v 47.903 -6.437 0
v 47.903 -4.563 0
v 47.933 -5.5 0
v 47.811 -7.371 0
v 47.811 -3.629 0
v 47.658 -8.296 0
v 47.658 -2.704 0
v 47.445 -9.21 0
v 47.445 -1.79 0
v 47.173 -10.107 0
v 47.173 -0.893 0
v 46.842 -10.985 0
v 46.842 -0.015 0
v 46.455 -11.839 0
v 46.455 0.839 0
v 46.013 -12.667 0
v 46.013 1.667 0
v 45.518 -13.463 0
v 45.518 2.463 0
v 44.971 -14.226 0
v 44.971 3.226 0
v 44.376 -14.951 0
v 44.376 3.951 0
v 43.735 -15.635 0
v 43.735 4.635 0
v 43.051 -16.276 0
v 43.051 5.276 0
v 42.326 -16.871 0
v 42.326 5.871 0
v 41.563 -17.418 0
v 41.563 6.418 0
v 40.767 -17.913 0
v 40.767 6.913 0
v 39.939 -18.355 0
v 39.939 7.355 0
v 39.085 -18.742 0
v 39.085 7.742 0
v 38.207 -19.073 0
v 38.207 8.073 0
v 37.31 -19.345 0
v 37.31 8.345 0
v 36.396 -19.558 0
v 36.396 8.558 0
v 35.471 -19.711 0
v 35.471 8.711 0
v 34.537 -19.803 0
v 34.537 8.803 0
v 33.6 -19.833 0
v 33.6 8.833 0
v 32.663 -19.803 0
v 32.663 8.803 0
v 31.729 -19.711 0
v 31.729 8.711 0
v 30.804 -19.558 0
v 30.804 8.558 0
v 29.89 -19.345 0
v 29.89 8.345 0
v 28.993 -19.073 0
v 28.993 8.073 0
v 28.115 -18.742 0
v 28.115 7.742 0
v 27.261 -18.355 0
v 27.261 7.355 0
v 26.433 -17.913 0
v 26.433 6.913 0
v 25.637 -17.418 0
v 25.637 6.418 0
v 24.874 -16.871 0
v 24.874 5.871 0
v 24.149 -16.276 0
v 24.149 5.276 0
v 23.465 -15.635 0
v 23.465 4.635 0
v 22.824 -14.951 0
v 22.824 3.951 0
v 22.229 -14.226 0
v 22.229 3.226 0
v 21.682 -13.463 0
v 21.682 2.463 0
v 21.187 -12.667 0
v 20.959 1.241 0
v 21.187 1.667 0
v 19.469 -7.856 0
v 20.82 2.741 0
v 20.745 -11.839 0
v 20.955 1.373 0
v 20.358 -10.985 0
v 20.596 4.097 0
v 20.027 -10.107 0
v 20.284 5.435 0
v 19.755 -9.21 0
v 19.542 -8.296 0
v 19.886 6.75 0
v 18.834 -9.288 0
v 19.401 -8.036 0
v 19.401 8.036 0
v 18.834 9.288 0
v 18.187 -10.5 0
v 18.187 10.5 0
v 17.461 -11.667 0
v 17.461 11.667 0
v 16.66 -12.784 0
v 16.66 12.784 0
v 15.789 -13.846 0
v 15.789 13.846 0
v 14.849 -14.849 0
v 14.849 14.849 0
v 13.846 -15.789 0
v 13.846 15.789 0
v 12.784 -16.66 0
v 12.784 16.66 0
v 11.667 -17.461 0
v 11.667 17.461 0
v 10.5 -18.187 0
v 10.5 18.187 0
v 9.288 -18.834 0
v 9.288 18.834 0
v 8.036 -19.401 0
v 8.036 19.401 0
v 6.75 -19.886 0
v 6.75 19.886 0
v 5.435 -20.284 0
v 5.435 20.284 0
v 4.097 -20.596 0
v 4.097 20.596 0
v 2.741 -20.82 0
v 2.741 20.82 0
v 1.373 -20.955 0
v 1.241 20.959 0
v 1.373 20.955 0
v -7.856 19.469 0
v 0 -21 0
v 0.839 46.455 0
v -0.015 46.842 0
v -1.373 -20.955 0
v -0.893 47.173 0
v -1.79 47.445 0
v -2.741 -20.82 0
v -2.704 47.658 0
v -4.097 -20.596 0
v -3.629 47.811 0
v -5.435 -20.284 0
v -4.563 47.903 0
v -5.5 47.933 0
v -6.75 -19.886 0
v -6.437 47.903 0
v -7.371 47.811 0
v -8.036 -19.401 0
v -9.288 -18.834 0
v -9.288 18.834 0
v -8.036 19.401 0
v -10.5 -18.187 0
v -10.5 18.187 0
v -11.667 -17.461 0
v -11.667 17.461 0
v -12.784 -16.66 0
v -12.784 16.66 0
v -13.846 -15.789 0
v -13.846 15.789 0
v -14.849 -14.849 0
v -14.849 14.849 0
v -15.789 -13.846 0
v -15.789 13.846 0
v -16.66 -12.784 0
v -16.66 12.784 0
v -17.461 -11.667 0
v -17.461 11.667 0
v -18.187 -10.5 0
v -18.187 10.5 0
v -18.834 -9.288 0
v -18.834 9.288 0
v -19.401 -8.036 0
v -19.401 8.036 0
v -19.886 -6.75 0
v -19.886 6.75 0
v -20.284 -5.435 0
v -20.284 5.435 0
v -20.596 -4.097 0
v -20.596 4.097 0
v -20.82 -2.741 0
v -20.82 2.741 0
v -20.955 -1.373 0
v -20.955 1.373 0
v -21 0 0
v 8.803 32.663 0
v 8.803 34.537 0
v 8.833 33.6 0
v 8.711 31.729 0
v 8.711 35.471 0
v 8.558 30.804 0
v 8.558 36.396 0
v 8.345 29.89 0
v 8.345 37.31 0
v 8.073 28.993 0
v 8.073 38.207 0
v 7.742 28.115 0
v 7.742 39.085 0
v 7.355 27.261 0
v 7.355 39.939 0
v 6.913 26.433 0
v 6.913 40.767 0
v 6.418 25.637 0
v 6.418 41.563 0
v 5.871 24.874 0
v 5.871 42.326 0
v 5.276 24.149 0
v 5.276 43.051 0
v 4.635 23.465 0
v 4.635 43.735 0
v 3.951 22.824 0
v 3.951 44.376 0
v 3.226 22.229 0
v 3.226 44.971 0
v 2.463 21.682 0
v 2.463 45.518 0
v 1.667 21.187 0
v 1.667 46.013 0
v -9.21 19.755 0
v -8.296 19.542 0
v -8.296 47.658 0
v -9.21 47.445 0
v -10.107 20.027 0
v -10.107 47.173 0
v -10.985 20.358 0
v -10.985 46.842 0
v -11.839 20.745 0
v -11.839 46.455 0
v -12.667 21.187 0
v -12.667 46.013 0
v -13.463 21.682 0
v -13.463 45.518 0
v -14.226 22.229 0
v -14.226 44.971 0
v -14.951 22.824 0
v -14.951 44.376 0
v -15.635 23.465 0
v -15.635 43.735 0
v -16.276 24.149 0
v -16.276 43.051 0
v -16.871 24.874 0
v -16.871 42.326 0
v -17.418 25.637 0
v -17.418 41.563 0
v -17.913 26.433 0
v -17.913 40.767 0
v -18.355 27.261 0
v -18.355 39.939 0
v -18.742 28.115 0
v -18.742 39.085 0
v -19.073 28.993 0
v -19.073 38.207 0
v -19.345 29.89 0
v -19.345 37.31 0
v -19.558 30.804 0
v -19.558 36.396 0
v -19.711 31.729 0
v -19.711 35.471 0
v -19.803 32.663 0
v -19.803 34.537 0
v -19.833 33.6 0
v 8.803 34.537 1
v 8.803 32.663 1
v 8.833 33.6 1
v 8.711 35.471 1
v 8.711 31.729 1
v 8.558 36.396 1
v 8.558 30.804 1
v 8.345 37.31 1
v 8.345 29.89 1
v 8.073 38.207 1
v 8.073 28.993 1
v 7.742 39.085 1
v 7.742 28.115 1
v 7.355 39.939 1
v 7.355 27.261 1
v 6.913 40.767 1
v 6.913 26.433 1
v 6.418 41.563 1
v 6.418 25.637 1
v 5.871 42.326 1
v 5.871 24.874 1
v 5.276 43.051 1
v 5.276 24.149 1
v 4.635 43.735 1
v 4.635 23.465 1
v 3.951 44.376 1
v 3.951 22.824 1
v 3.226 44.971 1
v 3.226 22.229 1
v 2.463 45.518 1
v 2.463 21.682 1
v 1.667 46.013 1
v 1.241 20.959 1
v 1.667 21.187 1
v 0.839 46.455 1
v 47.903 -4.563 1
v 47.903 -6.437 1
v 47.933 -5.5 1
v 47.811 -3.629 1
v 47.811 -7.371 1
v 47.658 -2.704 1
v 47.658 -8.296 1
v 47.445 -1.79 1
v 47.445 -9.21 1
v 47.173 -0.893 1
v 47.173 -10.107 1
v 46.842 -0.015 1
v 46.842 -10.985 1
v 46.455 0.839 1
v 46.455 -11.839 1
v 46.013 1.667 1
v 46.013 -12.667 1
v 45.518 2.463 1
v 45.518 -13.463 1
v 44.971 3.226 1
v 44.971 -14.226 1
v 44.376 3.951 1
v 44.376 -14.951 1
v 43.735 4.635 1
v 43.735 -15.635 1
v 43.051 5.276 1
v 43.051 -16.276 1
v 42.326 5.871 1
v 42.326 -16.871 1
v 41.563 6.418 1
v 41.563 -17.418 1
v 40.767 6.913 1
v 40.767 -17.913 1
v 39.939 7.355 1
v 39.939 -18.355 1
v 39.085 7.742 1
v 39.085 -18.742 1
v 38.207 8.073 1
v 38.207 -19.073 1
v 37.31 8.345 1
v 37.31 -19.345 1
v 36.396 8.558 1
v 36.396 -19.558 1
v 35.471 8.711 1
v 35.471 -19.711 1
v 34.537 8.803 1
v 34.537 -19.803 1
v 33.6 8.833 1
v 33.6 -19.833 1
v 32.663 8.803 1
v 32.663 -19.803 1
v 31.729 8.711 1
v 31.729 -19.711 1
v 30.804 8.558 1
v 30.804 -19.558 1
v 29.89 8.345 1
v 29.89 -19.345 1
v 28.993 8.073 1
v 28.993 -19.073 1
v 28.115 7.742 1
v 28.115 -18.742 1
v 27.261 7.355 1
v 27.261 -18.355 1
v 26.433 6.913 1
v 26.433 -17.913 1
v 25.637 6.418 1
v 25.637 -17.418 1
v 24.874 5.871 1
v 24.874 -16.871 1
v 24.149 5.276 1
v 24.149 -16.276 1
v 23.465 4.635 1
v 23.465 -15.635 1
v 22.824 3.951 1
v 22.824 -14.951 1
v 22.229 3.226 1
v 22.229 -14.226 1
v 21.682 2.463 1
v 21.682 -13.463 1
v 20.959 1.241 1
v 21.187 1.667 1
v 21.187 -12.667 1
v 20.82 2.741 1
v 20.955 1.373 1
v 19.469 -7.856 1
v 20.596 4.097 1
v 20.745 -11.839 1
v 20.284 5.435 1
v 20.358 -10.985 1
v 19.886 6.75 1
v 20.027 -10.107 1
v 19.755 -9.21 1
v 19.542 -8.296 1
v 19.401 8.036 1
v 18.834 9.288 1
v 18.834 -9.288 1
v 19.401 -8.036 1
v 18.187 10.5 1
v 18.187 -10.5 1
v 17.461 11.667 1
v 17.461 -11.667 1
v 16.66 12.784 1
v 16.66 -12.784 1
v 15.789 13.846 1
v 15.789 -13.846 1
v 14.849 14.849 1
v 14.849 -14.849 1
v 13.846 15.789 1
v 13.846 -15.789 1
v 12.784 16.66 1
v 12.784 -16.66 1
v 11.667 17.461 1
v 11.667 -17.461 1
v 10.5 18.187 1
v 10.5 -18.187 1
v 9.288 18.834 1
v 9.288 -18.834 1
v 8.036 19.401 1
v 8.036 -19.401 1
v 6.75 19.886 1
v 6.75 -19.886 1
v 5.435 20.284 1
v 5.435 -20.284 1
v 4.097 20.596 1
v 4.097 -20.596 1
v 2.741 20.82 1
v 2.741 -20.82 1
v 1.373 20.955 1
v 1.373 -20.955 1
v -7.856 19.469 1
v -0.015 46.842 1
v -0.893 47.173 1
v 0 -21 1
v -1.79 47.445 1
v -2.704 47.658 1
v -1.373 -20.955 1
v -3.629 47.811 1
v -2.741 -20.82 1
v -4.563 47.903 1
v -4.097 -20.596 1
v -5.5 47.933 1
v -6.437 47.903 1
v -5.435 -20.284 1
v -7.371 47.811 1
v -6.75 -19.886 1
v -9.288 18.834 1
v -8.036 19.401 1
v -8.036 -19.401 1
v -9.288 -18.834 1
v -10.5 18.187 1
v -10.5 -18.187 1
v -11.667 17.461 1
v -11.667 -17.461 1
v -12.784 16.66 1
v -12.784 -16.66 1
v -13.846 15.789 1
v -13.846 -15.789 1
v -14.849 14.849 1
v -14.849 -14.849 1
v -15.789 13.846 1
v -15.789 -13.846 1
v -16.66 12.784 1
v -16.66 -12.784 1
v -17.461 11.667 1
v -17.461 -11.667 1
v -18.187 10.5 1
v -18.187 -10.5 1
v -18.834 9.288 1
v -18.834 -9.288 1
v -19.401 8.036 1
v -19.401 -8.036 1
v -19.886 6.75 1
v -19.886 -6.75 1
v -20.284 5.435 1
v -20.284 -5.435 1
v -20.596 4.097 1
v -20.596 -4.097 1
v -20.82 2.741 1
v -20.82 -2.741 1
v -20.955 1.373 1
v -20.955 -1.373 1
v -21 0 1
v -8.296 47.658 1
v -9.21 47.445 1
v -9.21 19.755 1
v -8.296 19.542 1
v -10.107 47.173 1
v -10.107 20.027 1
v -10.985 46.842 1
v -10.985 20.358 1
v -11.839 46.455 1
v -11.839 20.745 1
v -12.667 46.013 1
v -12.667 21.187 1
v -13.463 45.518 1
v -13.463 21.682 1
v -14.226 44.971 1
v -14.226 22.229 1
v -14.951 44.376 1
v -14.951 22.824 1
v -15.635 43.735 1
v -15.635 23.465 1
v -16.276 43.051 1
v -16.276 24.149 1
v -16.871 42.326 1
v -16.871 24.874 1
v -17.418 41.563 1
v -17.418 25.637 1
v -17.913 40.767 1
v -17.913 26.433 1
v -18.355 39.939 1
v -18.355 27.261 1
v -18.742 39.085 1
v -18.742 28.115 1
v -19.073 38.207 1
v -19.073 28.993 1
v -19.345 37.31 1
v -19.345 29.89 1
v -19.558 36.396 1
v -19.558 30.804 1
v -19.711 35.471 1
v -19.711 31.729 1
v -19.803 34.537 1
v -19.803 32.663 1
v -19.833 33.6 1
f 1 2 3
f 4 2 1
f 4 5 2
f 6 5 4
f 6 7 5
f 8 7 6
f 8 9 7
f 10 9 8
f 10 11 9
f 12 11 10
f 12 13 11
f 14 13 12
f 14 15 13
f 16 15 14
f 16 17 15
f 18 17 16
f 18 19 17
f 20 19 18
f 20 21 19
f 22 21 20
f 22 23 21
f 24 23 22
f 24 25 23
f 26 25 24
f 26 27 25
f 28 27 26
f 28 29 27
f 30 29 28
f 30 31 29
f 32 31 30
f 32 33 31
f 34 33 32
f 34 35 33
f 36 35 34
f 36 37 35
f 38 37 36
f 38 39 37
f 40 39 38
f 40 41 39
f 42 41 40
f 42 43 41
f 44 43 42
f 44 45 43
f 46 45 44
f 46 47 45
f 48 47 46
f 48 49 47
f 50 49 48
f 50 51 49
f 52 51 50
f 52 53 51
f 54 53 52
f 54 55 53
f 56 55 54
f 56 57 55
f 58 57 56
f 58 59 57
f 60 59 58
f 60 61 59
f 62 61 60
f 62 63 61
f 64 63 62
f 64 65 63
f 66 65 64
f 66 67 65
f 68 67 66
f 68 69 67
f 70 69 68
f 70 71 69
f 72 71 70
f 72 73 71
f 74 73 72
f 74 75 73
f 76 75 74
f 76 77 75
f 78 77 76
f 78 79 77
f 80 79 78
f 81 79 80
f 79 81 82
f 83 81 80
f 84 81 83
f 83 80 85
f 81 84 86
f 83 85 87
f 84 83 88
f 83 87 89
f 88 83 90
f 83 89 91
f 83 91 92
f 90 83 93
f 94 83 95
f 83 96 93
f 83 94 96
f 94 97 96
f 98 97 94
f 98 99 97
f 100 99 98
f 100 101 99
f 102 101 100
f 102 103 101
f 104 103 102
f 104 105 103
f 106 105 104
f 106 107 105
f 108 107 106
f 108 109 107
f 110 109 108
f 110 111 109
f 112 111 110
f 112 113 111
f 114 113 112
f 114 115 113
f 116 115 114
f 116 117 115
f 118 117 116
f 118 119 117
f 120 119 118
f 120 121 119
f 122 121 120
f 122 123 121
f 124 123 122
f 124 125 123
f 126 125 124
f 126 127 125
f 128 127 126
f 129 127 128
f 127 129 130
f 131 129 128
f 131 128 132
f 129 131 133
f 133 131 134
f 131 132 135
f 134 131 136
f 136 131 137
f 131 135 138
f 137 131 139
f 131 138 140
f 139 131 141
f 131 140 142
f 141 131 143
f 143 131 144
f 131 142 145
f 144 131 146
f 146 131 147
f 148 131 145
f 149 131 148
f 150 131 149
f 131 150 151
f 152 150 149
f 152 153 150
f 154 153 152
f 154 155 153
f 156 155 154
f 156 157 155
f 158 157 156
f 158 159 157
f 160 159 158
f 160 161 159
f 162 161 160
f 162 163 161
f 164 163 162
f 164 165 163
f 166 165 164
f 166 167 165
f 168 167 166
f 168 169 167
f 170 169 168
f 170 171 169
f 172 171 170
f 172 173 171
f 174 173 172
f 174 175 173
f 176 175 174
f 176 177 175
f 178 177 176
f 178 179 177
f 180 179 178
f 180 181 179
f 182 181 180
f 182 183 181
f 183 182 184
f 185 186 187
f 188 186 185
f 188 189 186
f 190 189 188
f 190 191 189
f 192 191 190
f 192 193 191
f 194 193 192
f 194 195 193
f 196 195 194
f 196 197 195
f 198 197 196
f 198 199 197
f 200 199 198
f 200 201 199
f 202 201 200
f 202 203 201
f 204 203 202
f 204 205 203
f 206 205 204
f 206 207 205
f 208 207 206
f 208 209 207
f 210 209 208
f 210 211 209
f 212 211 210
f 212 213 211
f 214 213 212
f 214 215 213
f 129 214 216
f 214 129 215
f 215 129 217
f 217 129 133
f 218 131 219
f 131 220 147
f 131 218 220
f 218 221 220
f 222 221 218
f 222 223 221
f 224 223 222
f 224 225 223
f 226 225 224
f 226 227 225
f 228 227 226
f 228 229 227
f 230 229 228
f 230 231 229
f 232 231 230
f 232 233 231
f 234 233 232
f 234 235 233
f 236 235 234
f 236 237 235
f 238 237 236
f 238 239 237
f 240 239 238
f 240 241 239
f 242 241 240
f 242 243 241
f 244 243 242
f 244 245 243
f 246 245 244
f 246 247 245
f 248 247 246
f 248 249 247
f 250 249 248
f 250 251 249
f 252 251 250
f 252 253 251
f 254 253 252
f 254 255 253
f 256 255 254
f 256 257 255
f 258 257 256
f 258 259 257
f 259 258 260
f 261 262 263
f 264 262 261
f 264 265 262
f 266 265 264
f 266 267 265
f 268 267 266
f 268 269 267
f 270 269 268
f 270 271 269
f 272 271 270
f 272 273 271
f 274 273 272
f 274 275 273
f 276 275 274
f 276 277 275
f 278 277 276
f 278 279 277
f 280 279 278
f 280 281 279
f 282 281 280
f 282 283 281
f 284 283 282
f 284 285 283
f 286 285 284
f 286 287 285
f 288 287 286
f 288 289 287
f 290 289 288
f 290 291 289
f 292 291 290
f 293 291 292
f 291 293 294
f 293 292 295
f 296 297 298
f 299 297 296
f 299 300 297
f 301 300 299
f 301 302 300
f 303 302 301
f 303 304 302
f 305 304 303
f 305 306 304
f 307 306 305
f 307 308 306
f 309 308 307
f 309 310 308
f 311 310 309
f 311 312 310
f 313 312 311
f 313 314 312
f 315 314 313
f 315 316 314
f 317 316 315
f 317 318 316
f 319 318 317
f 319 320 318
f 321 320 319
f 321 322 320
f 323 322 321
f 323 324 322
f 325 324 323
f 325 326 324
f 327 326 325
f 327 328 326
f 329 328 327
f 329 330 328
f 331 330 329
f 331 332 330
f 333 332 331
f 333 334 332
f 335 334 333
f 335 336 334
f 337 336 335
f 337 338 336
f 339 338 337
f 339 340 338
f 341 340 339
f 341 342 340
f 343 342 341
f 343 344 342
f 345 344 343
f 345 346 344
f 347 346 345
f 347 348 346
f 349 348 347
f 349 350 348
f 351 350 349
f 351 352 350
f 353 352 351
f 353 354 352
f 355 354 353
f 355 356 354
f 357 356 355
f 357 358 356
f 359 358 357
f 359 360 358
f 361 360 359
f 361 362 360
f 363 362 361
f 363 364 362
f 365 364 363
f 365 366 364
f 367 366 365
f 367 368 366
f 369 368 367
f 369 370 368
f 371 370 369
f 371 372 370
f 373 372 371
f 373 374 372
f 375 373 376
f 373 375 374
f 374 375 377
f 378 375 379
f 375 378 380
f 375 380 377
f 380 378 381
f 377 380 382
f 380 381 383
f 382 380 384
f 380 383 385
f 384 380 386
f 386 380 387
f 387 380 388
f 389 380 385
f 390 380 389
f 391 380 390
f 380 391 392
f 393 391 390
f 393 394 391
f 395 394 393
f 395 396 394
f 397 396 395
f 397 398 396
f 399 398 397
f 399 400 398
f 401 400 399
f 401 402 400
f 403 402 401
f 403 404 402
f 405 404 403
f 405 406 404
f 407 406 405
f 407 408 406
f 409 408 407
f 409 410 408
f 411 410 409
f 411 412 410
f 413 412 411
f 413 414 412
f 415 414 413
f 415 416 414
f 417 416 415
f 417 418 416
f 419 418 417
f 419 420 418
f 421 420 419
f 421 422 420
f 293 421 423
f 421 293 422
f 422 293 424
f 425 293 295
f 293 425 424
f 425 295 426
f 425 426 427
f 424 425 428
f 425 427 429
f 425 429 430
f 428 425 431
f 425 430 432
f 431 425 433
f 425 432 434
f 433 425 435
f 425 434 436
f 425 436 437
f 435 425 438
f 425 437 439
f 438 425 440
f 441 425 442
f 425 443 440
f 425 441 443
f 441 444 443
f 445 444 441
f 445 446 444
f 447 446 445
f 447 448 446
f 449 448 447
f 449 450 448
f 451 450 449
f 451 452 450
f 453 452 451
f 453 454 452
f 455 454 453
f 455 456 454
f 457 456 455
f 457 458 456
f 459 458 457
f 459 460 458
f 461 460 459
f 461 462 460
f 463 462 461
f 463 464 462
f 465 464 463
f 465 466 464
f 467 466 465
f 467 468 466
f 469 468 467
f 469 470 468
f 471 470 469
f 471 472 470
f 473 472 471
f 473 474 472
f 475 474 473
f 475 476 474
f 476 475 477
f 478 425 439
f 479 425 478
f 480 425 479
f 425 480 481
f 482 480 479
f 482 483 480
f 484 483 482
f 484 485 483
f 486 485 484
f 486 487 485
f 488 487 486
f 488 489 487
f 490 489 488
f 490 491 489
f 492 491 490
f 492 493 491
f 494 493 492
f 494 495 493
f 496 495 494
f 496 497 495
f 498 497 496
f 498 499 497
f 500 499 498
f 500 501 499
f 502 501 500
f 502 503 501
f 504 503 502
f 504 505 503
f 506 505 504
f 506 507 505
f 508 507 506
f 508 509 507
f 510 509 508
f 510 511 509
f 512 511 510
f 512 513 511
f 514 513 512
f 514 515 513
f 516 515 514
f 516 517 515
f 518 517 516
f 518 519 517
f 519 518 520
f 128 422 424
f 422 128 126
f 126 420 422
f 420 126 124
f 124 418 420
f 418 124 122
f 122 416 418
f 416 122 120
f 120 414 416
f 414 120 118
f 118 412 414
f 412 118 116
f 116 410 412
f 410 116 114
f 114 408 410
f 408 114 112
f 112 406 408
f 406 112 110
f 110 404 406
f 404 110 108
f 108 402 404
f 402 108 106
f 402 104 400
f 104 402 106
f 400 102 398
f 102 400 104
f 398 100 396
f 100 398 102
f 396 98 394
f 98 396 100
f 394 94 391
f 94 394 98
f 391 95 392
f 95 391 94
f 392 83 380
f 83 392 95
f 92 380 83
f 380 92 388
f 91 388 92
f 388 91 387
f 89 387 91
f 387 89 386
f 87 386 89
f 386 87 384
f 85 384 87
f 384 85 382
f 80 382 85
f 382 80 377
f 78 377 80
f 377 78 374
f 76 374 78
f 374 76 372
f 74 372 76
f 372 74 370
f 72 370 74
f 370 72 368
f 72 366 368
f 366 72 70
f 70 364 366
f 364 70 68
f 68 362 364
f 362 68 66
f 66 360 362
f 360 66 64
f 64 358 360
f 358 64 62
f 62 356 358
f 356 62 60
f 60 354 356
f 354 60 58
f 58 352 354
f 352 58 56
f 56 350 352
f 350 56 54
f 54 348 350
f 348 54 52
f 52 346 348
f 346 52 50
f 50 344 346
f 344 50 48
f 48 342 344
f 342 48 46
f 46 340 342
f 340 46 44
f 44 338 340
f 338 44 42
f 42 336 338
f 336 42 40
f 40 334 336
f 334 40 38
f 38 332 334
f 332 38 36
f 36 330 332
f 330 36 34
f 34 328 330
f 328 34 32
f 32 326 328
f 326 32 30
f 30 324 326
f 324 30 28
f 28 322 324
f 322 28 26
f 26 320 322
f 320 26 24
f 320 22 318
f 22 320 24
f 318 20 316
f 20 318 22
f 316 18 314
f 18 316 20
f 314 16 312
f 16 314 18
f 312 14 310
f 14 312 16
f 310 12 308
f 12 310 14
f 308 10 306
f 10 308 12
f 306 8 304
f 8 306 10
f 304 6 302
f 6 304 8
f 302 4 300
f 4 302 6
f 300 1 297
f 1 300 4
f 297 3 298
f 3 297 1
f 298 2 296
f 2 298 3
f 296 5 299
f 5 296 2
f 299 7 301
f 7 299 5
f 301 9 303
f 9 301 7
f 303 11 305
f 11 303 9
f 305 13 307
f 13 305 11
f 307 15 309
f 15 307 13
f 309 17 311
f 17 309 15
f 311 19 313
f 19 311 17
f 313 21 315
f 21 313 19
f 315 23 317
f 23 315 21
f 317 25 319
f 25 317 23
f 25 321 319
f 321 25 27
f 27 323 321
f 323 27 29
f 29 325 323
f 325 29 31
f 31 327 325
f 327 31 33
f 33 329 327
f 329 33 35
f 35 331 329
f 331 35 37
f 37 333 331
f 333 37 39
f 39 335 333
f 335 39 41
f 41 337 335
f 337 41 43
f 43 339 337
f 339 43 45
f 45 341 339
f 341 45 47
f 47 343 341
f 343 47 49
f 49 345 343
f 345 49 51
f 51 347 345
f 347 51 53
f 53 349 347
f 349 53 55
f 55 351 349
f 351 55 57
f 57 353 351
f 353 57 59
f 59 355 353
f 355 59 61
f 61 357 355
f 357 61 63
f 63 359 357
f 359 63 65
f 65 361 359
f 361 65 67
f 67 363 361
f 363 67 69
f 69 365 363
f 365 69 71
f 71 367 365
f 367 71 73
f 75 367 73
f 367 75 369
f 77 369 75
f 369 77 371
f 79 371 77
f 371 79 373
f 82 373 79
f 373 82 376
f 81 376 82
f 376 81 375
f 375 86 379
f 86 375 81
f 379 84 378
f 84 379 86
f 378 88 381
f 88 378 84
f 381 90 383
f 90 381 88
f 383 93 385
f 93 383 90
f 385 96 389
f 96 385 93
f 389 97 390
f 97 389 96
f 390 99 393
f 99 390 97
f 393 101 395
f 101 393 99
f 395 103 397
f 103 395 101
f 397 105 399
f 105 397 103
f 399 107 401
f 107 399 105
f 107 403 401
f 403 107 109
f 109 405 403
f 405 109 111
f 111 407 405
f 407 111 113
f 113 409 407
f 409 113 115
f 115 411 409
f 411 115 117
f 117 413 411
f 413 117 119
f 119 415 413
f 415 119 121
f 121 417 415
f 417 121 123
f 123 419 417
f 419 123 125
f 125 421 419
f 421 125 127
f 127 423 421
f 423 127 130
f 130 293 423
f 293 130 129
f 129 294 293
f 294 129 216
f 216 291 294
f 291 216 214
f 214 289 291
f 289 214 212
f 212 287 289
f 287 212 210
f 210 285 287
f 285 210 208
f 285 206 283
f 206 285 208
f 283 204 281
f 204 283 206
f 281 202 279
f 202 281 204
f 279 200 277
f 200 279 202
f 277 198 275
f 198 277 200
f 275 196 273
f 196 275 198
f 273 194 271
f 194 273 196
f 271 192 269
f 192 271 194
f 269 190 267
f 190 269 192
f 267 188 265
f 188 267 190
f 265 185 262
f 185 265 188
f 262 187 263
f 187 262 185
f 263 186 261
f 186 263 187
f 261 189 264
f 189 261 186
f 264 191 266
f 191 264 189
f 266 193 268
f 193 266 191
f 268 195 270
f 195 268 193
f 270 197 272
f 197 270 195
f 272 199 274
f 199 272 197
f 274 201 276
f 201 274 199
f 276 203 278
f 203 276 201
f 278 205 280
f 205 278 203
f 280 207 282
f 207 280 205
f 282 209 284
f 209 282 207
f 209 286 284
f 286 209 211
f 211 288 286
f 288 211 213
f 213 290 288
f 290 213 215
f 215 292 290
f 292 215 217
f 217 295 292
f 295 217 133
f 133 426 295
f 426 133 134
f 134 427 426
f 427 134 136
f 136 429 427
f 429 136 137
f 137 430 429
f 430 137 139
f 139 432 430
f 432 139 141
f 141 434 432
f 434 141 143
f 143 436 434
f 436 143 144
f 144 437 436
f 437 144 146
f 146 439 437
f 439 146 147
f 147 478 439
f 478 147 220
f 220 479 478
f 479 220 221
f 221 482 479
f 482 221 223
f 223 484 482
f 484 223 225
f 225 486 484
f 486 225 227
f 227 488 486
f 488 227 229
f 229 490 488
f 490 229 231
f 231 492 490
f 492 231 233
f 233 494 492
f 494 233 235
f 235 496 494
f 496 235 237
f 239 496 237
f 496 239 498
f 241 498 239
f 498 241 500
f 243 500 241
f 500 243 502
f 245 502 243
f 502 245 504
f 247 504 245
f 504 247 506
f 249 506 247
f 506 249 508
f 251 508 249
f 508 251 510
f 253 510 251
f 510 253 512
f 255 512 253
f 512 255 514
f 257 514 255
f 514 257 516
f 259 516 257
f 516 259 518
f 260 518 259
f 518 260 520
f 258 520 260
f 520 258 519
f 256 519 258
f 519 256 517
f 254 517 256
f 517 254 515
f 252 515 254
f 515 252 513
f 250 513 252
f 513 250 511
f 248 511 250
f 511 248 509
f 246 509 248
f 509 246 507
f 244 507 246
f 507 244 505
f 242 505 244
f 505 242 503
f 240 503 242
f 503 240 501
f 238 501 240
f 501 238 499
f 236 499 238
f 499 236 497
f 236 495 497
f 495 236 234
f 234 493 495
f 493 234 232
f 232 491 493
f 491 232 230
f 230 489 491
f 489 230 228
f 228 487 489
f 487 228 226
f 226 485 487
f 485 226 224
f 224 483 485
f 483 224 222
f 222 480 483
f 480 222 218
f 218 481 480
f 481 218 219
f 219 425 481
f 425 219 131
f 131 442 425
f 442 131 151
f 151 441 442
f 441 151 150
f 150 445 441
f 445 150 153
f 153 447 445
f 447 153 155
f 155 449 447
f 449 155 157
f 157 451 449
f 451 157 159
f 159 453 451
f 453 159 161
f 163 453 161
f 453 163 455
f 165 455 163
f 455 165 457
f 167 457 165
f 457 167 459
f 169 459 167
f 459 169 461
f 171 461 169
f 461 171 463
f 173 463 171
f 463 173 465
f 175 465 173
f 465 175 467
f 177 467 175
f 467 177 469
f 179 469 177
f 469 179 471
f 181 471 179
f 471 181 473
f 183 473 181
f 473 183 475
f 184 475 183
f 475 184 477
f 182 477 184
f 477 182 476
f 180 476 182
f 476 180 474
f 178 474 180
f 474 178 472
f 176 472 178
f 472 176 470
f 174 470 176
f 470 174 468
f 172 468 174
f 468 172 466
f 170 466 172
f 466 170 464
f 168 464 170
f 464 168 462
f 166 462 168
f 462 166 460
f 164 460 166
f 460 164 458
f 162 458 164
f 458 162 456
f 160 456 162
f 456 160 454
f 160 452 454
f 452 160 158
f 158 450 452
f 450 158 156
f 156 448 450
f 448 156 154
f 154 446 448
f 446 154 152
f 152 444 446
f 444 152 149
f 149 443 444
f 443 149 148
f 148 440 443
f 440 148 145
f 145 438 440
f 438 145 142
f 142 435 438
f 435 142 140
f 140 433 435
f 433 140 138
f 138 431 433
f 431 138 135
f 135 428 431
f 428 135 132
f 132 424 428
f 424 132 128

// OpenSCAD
// file: random_maze_circle_generator.scad
use <2d.scad>;
use <random_maze_generator.scad>;

radius = 40; 

wall_height = 2;
wall_thickness = 2; 

cblocks = 25; 
rblocks = 5;

bottom = "YES";

module circle_maze(radius, cblocks, rblocks, thickness = 1) {
    full_circle_angle = 360;
    arc_angle = full_circle_angle / cblocks;
	length_rblock = radius / (rblocks + 2);
	
	maze = go_maze(1, 1, cblocks, rblocks, replace([rblocks, cblocks, 0, UP_RIGHT_WALL()], [rblocks, cblocks, 0, UP_WALL()], init_maze(cblocks, rblocks)));
	
	// inner circle
	rotate([0, 0, 180]) 
	    arc(length_rblock, [0, full_circle_angle - arc_angle], thickness);		
		
	rotate([0, 0, 315]) 	
	    x_line([length_rblock + thickness / 2, 0], length_rblock, thickness); 
		
	rotate([0, 0, arc_angle]) 
	    arc(length_rblock * 2, [0, full_circle_angle - arc_angle], thickness);
	
	// maze
    for(i = [0:len(maze) - 1]) { 
        cord = maze[i];
		cr = cord[0] + 2; 
		cc = cord[1] - 1;
        v = cord[3];
        
        if(v == 1 || v == 3) {
		    rotate([0, 0, cc * arc_angle])
                x_line([(cr - 1)* length_rblock + thickness / 2, 0], length_rblock, thickness); 
        }
        if(v == 2 || v == 3) {
		    rotate([0, 0, cc * arc_angle])
		        arc(cr * length_rblock, [0, arc_angle], thickness);
        } 
		if(v == 0 || v == 1) {
		    r1 = length_rblock * 2;
			r2 = cr * length_rblock;
		    rotate([0, 0, cc * arc_angle])
		        arc(cr * length_rblock, [0, arc_angle * (r2 - r1) / r2], thickness);
		}
    }  	
}

if(bottom == "YES")	{
	linear_extrude(wall_thickness)
	    circle(radius + wall_thickness, $fn = 96);		
}

linear_extrude(wall_height + wall_thickness) 
    circle_maze(radius, cblocks, rblocks, wall_thickness);
	

 
 
// file: random_maze_generator.scad
use <2d.scad>;

rows = 10; 
columns = 10; 
wall_thickness = 2;
wall_height = 5;
block_width = 5;


/*
 * constants, for clearness
 *
 */
 
// random directions, for picking up a direction to visit the next block
function PERMUTATION_OF_FOUR() = [
    [1, 2, 3, 4],
    [1, 2, 4, 3],
    [1, 3, 2, 4],
    [1, 3, 4, 2],
    [1, 4, 2, 3],
    [1, 4, 3, 2],
    [2, 1, 3, 4],
    [2, 1, 4, 3],
    [2, 3, 1, 4],
    [2, 3, 4, 1],
    [2, 4, 1, 3],
    [2, 4, 3, 1],
    [3, 1, 2, 4],
    [3, 1, 4, 2],
    [3, 2, 1, 4],
    [3, 2, 4, 1],
    [3, 4, 1, 2],
    [3, 4, 2, 1],
    [4, 1, 2, 3],
    [4, 1, 3, 2],
    [4, 2, 1, 3],
    [4, 2, 3, 1],
    [4, 3, 1, 2],
    [4, 3, 2, 1]
];

function NO_WALL() = 0;
function UP_WALL() = 1;
function RIGHT_WALL() = 2;
function UP_RIGHT_WALL() = 3;

function NOT_VISITED() = 0;
function VISITED() = 1;

/* 
 * modules for creating a maze
 *
 */

// create the outer wall of maze
module maze_outer_wall(rows, columns, block_width = 5, wall_thickness = 1) {
    x_line([0, rows * block_width], columns * block_width, wall_thickness);
    y_line([0, block_width], (rows - 1) * block_width, wall_thickness);
}

// create the inner wall of maze
module maze_inner_wall(maze, block_width = 5, wall_thickness = 1) {
    for(i = [0:len(maze) - 1]) {
        cord = maze[i];
        x = (cord[0] - 1) * block_width;
        y = (cord[1] - 1) * block_width;
        v = cord[3];
        
        if(v == 1 || v == 3) {
            x_line([x, y], block_width, wall_thickness);
        }
        if(v == 2 || v == 3) {
            y_line([x + block_width, y], block_width, wall_thickness);
        }
    }  
}

// create a maze
module maze(rows, columns, maze_vector, block_width = 5, wall_thickness = 1) {
     maze_outer_wall(rows, columns, block_width, wall_thickness);
     maze_inner_wall(maze_vector, block_width, wall_thickness);
}

/* 
 * utilities functions
 *
 */

// comare the equality of [x1, y1] and [x2, y2]
function cord_equals(cord1, cord2) = cord1 == cord2;

// is the point visited?
function not_visited(cord, vs, index = 0) =
    index == len(vs) ? true : 
        (cord_equals([vs[index][0], vs[index][1]], cord) && vs[index][2] == 1 ? false :
            not_visited(cord, vs, index + 1));
            
// pick a direction randomly
function rand_dirs() =
    PERMUTATION_OF_FOUR()[round(rands(0, 24, 1)[0])]; 

// give a index (exclusivly), slice a vector 
function head_to(i, vs) =
    i >= len(vs) ? vs : (
        i == 0 ? [] : concat(head_to(i - 1, vs), [vs[i - 1]])
    );

// give a index (exclusivly), slice a vector 
function tail_from(i, vs, index = 0, new_vs = []) =
    i >= len(vs) ? [] : (
        index < i ? tail_from(i, vs, index + 1) : (
            index < len(vs) ? tail_from(i, vs, index + 1, concat(new_vs, [vs[index]])) : new_vs
        )
    );

// replace v1 in the vector with v2 
function replace(v1, v2, vs, index = 0) =
    index == len(vs) ? vs : (
        vs[index] == v1 ? concat(concat(head_to(index, vs), [v2]), tail_from(index + 1, vs)) : replace(v1, v2, vs, index + 1)
    );
    
/* 
 * functions for generating a maze vector
 *
 */

// initialize rows of a maze
function init_row(n, length) =
    length == 0 ? [] : concat(init_row(n, length - 1), [[length, n, 0, UP_RIGHT_WALL()]]);
    
// initialize a maze
function init_maze(rows, columns) =
    rows == 0 ? [] : concat(init_maze(rows - 1, columns), init_row(rows, columns));
    
// find a vector in the maze vector
function find(i, j, maze_vector, index = 0) =
    index == len(maze_vector) ? [] : (
        cord_equals([i, j], [maze_vector[index][0], maze_vector[index][1]]) ? maze_vector[index] : find(i, j, maze_vector, index + 1)
    );

////
// NO_WALL = 0;
// UP_WALL = 1;
// RIGHT_WALL = 2;
// UP_RIGHT_WALL = 3;
function delete_right_wall(original_block) = 
    original_block == NO_WALL() || original_block == RIGHT_WALL() ? NO_WALL() : UP_WALL();

function delete_up_wall(original_block) = 
    (original_block == NO_WALL() || original_block == UP_WALL()) ? NO_WALL() : RIGHT_WALL();
    
function delete_right_wall_of(vs, is_visited, maze_vector) =
    replace(vs, [vs[0], vs[1] , is_visited, delete_right_wall(vs[3])] ,maze_vector);

function delete_up_wall_of(vs, is_visited, maze_vector) =
    replace(vs, [vs[0], vs[1] , is_visited, delete_up_wall(vs[3])] ,maze_vector);

function go_right(i, j, rows, columns, maze_vector) =
    go_maze(i + 1, j, rows, columns, delete_right_wall_of(find(i, j, maze_vector), VISITED(), maze_vector));
    
function go_up(i, j, rows, columns, maze_vector) =
    go_maze(i, j - 1, rows, columns, delete_up_wall_of(find(i, j, maze_vector), VISITED(), maze_vector));
    
function visit(v, maze_vector) =
    replace(v, [v[0], v[1], VISITED(), v[3]], maze_vector);
 
function go_left(i, j, rows, columns, maze_vector) =
    go_maze(i - 1, j, rows, columns, delete_right_wall_of(find(i - 1, j, maze_vector), NOT_VISITED(), maze_vector));
    
function go_down(i, j, rows, columns, maze_vector) =
    go_maze(i, j + 1, rows, columns, delete_up_wall_of(find(i, j + 1, maze_vector), NOT_VISITED(), maze_vector));
    
function go_maze(i, j, rows, columns, maze_vector) =
    look_around(i, j, rand_dirs(), rows, columns, visit(find(i, j, maze_vector), maze_vector));
    
function look_around(i, j, dirs, rows, columns, maze_vector, index = 0) =
    index == 4 ? maze_vector : 
        look_around( 
            i, j, dirs, 
            rows, columns, 
            build_wall(i, j, dirs[index], rows, columns, maze_vector), 
            index + 1
        ); 

function build_wall(i, j, n, rows, columns, maze_vector) = 
    n == 1 && i != columns && not_visited([i + 1, j], maze_vector) ? go_right(i, j, rows, columns, maze_vector) : ( 
        n == 2 && j != 1 && not_visited([i, j - 1], maze_vector) ? go_up(i, j, rows, columns, maze_vector)  : (
            n == 3 && i != 1 && not_visited([i - 1, j], maze_vector) ? go_left(i, j,rows, columns,  maze_vector)  : (
                n == 4 && j != rows && not_visited([i, j + 1], maze_vector) ? go_down(i, j, rows, columns, maze_vector) : maze_vector
            ) 
        )
    ); 
 
/*
 * create a maze
 *
 */
maze_vector = go_maze(1, 1, rows, columns, replace([columns, rows, 0, UP_RIGHT_WALL()], [columns, rows, 0, UP_WALL()], init_maze(rows, columns)));
linear_extrude(wall_height) 
    maze(rows, columns, maze_vector, block_width, wall_thickness);
// file: 2d.scad
function PI() = 3.14159;

// give a [x, y] point and length. draw a line in the x direction
module x_line(point, length, thickness = 1) {
    offset = thickness / 2;
    translate([point[0] - offset, point[1] - offset, 0]) 
        square([length + thickness, thickness]);
}

// give a [x, y] point and length. draw a line in the y direction
module y_line(point, length, thickness = 1) {
    offset = thickness / 2;
    translate([point[0] - offset, point[1] - offset, 0])  
        square([thickness, length + thickness]);
}

module a_quarter_arc(radius, angle, width = 1) {
    outer = radius + width;
    intersection() {
        difference() {
            offset(r = width) circle(radius, $fn=96); 
            circle(radius, $fn=96);
        }
        polygon([[0, 0], [outer, 0], [outer, outer * sin(angle)], [outer * cos(angle), outer * sin(angle)]]);
    }
}

module arc(radius, angles, width = 1) {
    angle_from = angles[0];
    angle_to = angles[1];
    angle_difference = angle_to - angle_from;
    outer = radius + width;
    rotate(angle_from)
        if(angle_difference <= 90) {
            a_quarter_arc(radius, angle_difference, width);
        } else if(angle_difference > 90 && angle_difference <= 180) {
            arc(radius, [0, 90], width);
            rotate(90) a_quarter_arc(radius, angle_difference - 90, width);
        } else if(angle_difference > 180 && angle_difference <= 270) {
            arc(radius, [0, 180], width);
            rotate(180) a_quarter_arc(radius, angle_difference - 180, width);
        } else if(angle_difference > 270 && angle_difference <= 360) {
            arc(radius, [0, 270], width);
            rotate(270) a_quarter_arc(radius, angle_difference - 270, width);
       }
}
// main file
use <2d.scad>;
use <random_maze_generator.scad>;
use <random_maze_circle_generator.scad>;

radius = 20; 

wall_height = 2;
wall_thickness = 1; 

cblocks = 25; 
rblocks = 5;

face_bottom = "YES";
ears_bottom = "YES";
   
module mickey_maze(radius, cblocks, rblocks, thickness = 1) {
    // face 
	difference() {   
		circle_maze(radius, cblocks, rblocks, wall_thickness);

		union() {
		    rotate([0, 0, 91])
				arc(radius - wall_thickness / 2, [0, 360 / cblocks], wall_thickness * 2);
			rotate([0, 0, -360 / cblocks - 2])
				arc(radius - wall_thickness / 2, [0, 360 / cblocks], wall_thickness * 2);
		}
	}
	
	ear_cblocks = 2 * (cblocks - cblocks % 3) / 3;
	
	// ear1
	translate([radius * 1.68, -radius * 0.275, 0])  
	    rotate([0, 0, 181.5]) 
		    circle_maze(radius / 1.5, ear_cblocks, rblocks, wall_thickness);
		
	// ear2
	translate([-radius * 0.275, radius * 1.68, 0])  
		rotate([0, 0, -67])  
			circle_maze(radius / 1.5, ear_cblocks, rblocks, wall_thickness);		
}

module mickey_maze_bottom(radius, cblocks, rblocks, thickness = 1, face_bottom = "YES", ears_bottom = "YES") {
    linear_extrude(wall_thickness) union() {
		if(face_bottom == "YES") {
			circle(radius + wall_thickness, $fn = 96);
		}
		
		// ears
		if(ears_bottom == "YES") {	
			translate([radius * 1.68, -radius * 0.275, 0])  
				circle(radius / 1.5 + wall_thickness, $fn = 96);
							
			translate([-radius * 0.275, radius * 1.68, 0])  
				circle(radius / 1.5 + wall_thickness, $fn = 96);									
		}
	}
}

mickey_maze_bottom(radius, cblocks, rblocks, wall_thickness, face_bottom, ears_bottom);

linear_extrude(wall_height + wall_thickness)
    mickey_maze(radius, cblocks, rblocks, wall_thickness);
